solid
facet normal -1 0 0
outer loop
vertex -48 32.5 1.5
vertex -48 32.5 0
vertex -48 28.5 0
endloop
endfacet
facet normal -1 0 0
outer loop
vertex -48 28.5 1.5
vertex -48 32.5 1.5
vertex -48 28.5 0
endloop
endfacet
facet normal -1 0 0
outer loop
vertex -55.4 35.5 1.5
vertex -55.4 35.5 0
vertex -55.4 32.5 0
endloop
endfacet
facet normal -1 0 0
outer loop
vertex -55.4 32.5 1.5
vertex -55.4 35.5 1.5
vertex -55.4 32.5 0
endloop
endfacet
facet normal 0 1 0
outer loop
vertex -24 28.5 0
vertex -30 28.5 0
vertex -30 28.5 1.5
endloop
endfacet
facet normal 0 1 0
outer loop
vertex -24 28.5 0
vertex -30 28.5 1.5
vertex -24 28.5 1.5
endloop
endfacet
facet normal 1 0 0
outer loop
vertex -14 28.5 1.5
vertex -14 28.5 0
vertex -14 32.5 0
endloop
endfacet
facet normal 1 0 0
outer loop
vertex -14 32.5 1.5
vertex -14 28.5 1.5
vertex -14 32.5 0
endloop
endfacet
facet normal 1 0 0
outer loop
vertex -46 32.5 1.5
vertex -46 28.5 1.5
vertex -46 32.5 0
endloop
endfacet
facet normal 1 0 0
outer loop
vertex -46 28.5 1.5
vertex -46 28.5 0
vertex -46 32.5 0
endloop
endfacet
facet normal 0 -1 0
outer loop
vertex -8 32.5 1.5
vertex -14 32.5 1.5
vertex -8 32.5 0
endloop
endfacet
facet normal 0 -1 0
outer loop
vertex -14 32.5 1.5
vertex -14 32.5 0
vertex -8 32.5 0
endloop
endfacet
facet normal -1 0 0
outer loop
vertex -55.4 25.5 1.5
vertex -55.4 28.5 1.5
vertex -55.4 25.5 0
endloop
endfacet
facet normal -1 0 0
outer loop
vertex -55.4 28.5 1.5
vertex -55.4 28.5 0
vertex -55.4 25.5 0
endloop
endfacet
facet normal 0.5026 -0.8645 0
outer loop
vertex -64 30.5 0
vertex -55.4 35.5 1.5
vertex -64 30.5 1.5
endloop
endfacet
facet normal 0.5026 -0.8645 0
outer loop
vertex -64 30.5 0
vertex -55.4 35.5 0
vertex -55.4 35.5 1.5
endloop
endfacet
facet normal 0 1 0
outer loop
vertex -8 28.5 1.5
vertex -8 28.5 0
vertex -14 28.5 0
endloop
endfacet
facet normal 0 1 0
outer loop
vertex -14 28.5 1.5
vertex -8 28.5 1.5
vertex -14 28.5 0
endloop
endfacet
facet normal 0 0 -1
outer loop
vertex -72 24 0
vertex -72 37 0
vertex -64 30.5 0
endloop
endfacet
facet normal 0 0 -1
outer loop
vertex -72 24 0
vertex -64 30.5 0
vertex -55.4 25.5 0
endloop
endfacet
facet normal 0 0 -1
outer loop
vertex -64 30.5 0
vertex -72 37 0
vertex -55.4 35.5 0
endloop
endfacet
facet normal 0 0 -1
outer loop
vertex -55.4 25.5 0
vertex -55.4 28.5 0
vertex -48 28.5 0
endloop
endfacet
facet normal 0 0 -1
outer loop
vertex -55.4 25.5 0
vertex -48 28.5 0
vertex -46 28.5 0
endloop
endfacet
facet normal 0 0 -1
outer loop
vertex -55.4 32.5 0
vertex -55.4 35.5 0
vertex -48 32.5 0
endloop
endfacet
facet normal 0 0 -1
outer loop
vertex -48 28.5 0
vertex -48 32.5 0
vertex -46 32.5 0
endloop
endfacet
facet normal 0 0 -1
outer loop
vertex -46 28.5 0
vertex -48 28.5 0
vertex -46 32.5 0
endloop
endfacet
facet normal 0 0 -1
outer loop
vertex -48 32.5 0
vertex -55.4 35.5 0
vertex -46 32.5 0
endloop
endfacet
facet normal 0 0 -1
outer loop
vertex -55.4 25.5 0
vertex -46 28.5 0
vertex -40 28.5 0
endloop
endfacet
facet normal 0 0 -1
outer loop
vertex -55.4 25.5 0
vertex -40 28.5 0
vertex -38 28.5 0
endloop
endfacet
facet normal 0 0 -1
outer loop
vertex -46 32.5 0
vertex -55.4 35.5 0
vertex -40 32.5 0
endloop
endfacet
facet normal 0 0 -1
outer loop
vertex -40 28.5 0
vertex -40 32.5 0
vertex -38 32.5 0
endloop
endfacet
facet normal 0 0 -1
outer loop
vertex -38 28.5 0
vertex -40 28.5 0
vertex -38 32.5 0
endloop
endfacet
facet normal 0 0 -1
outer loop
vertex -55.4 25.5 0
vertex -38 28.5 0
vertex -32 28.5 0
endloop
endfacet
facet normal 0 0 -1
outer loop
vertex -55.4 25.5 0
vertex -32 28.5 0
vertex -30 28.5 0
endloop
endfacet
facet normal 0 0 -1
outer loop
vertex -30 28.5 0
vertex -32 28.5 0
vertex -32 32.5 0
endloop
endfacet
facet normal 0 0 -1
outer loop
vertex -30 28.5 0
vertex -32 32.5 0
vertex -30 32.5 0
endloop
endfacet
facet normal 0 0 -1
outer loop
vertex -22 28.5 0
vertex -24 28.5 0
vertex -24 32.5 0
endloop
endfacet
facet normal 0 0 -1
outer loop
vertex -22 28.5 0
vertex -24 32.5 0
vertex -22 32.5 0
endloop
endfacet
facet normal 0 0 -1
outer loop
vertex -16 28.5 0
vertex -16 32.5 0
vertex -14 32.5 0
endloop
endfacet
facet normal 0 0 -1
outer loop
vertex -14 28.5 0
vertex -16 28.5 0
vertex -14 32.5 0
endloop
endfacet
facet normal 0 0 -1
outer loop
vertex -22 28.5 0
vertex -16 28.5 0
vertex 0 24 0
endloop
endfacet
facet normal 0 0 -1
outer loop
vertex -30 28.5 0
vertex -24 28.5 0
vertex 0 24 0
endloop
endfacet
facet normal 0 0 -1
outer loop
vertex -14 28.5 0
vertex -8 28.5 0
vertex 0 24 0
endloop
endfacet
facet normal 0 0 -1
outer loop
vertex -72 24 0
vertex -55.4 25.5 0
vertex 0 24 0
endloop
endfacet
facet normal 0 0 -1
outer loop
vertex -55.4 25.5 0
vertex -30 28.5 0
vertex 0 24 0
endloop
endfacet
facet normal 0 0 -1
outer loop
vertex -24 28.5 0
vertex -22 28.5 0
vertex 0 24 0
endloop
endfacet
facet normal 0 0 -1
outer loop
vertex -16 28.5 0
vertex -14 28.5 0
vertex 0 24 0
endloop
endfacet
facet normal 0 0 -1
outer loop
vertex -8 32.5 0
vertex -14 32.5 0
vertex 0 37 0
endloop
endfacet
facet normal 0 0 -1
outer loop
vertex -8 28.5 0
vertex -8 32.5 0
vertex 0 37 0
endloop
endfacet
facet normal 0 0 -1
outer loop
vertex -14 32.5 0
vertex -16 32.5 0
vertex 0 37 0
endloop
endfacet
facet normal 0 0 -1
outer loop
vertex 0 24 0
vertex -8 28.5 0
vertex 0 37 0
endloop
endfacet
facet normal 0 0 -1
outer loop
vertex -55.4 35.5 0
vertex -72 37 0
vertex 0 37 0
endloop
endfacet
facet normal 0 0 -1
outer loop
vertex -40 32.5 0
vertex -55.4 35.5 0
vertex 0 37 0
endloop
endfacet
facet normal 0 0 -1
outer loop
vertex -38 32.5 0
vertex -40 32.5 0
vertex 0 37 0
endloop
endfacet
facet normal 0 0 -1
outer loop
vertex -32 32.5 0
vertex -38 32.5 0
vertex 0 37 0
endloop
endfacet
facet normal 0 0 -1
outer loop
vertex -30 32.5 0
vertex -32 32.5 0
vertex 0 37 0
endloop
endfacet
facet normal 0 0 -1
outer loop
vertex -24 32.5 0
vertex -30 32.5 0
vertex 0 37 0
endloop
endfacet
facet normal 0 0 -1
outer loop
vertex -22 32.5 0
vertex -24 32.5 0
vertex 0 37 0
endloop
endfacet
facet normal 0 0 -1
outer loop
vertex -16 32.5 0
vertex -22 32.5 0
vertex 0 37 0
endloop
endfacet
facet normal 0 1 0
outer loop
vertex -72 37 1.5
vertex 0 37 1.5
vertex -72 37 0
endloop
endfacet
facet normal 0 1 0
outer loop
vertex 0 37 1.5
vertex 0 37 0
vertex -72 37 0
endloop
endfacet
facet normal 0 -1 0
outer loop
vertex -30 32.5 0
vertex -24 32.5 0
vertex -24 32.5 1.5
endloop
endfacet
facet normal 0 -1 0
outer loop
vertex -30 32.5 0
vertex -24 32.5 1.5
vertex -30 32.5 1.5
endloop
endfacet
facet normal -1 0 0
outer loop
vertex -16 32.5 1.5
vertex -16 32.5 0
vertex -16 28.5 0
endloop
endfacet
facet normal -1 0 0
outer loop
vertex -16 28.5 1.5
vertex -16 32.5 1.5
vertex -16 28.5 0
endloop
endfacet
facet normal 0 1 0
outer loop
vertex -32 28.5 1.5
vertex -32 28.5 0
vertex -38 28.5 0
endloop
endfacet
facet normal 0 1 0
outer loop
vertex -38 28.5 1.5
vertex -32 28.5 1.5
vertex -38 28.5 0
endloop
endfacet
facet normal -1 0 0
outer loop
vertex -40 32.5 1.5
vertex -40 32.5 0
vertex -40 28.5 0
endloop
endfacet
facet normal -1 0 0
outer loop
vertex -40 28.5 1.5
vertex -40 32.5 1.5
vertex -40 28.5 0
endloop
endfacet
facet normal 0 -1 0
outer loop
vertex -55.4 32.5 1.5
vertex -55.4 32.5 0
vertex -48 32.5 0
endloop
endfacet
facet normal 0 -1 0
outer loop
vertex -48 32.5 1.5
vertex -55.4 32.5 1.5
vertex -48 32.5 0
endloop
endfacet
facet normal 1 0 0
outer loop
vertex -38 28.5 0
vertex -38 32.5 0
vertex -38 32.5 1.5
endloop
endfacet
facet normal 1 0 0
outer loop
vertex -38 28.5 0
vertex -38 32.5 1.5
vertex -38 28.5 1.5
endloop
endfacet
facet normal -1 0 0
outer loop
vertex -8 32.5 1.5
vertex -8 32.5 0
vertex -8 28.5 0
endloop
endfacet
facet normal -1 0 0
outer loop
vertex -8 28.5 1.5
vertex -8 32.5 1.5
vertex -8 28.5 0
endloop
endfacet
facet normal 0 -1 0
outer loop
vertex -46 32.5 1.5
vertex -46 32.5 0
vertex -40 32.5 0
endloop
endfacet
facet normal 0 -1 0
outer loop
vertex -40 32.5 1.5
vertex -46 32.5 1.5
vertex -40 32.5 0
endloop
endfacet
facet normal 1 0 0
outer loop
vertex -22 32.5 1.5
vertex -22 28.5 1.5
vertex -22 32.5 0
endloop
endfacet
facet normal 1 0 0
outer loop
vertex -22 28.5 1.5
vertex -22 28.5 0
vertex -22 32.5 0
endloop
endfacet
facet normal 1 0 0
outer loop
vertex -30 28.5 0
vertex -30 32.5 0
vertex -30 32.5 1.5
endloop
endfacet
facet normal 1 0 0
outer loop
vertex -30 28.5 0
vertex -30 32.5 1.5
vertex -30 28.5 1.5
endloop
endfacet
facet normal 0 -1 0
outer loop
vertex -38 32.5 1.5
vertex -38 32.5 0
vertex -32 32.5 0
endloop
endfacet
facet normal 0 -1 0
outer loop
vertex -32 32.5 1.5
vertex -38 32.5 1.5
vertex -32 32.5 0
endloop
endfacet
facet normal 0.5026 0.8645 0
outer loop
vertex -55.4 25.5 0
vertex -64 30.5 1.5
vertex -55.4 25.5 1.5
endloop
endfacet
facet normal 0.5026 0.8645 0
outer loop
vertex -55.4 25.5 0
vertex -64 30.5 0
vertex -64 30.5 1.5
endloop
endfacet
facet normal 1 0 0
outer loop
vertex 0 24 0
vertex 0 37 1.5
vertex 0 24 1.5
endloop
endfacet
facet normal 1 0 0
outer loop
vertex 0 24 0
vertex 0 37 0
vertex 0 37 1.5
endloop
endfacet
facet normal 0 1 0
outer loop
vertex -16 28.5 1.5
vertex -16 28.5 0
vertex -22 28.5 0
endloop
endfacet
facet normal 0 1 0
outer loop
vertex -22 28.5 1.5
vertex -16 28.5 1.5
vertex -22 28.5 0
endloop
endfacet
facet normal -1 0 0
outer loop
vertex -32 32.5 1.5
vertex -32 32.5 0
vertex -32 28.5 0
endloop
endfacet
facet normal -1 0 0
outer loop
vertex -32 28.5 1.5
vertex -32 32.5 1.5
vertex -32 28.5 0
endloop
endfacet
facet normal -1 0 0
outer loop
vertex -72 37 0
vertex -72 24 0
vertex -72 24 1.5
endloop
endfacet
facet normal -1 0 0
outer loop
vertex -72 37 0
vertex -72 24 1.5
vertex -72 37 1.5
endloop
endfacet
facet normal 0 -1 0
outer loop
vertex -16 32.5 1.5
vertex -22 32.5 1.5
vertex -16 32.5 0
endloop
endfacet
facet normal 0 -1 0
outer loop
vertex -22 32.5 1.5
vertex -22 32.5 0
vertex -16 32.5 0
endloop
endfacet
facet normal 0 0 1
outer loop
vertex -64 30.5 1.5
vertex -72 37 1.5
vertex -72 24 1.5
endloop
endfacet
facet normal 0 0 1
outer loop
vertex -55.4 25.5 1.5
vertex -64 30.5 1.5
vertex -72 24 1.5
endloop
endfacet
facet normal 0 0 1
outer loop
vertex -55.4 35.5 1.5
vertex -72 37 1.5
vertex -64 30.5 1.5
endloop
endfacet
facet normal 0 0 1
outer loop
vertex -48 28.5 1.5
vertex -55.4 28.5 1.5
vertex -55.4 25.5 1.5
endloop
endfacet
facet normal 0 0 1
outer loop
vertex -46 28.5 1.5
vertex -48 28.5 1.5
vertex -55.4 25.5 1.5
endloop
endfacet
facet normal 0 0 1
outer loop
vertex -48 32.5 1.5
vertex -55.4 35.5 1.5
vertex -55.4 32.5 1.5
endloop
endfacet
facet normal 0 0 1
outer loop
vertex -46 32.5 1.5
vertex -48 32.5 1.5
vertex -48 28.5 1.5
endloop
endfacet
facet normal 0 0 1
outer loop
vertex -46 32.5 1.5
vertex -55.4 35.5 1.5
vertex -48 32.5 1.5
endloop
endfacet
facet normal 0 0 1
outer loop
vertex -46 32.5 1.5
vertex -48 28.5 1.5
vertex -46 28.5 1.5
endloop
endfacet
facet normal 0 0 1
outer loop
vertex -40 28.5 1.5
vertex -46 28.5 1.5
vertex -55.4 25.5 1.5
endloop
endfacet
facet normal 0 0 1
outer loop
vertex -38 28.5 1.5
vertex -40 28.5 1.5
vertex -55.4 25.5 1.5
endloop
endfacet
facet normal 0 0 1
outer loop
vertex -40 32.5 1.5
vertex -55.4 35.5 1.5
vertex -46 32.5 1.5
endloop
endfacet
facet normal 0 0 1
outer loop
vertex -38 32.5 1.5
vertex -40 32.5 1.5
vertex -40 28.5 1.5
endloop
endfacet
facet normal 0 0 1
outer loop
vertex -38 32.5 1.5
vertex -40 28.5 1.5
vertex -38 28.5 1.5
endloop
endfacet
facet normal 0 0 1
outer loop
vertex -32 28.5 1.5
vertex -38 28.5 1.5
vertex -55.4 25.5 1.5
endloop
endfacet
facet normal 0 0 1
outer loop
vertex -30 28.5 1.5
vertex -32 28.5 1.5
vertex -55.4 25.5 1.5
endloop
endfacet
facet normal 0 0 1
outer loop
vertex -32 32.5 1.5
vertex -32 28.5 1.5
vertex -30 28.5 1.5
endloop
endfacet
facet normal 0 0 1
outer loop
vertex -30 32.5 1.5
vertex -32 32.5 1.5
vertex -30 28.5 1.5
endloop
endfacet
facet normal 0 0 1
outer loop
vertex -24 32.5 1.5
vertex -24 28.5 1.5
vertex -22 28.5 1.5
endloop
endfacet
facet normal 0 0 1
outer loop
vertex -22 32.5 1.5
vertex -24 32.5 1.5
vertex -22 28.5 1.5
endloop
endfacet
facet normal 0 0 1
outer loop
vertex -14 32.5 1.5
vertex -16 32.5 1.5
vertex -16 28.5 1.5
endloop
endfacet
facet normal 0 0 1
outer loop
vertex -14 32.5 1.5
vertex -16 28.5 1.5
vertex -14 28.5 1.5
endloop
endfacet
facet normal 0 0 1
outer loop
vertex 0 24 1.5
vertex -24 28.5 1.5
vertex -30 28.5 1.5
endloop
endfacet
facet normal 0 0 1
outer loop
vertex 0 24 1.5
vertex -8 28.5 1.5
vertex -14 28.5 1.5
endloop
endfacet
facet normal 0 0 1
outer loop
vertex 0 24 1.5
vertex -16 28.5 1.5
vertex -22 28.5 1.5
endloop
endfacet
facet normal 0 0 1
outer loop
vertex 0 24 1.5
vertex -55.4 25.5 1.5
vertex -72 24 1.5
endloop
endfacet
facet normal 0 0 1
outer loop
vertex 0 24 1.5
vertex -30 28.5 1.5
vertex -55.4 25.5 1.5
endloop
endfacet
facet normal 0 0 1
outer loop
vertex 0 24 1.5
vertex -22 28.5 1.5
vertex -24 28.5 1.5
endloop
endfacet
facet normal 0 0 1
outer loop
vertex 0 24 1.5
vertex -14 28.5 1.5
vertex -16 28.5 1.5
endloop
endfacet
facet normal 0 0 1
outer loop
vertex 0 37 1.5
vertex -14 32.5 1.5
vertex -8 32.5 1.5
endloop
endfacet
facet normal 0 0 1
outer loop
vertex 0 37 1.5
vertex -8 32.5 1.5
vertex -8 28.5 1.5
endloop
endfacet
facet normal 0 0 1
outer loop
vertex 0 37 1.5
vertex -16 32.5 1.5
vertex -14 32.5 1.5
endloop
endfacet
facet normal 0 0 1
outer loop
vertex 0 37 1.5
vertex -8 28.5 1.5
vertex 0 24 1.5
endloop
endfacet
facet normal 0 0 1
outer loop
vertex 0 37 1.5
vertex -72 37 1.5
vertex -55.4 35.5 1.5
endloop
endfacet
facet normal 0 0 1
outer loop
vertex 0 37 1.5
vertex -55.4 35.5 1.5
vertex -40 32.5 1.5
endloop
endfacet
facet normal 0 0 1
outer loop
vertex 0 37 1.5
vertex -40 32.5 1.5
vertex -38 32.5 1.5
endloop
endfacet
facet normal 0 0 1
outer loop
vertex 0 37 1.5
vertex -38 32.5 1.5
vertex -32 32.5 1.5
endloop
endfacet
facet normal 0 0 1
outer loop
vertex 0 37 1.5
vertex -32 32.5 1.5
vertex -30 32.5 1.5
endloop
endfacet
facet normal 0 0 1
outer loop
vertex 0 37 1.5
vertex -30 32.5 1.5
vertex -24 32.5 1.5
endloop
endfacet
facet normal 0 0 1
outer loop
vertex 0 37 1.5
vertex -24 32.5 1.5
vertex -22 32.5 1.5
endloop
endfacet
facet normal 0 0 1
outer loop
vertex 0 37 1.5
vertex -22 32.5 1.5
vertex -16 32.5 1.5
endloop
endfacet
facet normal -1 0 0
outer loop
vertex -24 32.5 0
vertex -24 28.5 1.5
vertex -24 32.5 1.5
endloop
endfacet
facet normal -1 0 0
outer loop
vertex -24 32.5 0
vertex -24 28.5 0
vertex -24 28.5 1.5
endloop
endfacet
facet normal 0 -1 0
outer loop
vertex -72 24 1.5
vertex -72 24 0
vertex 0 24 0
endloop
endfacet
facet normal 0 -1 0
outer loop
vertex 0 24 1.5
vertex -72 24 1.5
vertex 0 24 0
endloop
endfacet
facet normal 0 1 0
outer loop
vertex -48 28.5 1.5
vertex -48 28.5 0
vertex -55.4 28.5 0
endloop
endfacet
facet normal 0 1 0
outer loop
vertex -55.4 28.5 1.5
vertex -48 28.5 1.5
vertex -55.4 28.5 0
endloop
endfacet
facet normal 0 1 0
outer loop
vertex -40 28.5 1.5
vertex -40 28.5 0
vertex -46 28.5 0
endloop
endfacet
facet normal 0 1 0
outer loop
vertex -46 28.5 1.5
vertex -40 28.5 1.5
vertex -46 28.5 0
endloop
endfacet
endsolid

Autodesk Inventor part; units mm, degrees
ref_plane "YZ Plane" through (0, 0, 0) normal (1, 0, 0) x (0, 1, 0)
ref_plane "XZ Plane" through (0, 0, 0) normal (0, 1, 0) x (-1, 0, 0)
ref_plane "XY Plane" through (0, 0, 0) normal (0, 0, 1) x (1, 0, 0)
sketch "Sketch1" plane through (0, 0, 0) normal (0, 0, 1) x (1, 0, 0)
  line L0 (-64, 0) -> (-72, 0)
  line L1 (0, 37) -> (0, 24)
  line L2 (-72, 24) -> (-72, 37)
  line L3 (0, 0) -> (0, 24) construction
  line L4 (-72, 24) -> (0, 24)
  line L5 (-24, 22.0212) -> (-24, 32.5) construction
  line L6 (-24, 32.5) -> (-30, 32.5)
  line L7 (-30, 32.5) -> (-30, 28.5)
  line L8 (-30, 28.5) -> (-24, 28.5)
  line L9 (-24, 28.5) -> (-24, 32.5)
  line L10 (-30, 32.5) -> (-35, 32.5) construction
  line L11 (-22, 32.5) -> (-16, 32.5)
  line L12 (-16, 32.5) -> (-16, 28.5)
  line L13 (-16, 28.5) -> (-22, 28.5)
  line L14 (-22, 28.5) -> (-22, 32.5)
  line L15 (-14, 32.5) -> (-8, 32.5)
  line L16 (-8, 32.5) -> (-8, 28.5)
  line L17 (-8, 28.5) -> (-14, 28.5)
  line L18 (-14, 28.5) -> (-14, 32.5)
  line L19 (0, 24) -> (0, 37) construction
  line L20 (0, 37) -> (-91.064, 37) construction
  line L21 (0, 37) -> (-72, 37)
  line L22 (-72, 24) -> (-72, 37)
  line L23 (0, 24) -> (0, 37)
  line L24 (-72, 24) -> (-72, 30.5) construction
  line L25 (-72, 30.5) -> (-41.865, 30.5) construction
  line L26 (-64, 30.5) -> (-55.4, 30.5) construction
  line L27 (-55.4, 30.5) -> (-55.4, 35.5) construction
  line L28 (-55.4, 35.5) -> (-64, 30.5)
  line L29 (-55.4, 30.5) -> (-55.4, 25.5) construction
  line L30 (-64, 30.5) -> (-55.4, 25.5)
  line L31 (-32, 28.5) -> (-38, 28.5)
  line L32 (-38, 28.5) -> (-38, 32.5) construction
  line L33 (-38, 32.5) -> (-32, 32.5)
  line L34 (-32, 32.5) -> (-32, 28.5) construction
  line L35 (-38, 32.5) -> (-38, 28.5)
  line L36 (-32, 32.5) -> (-32, 28.5)
  line L37 (-40, 28.5) -> (-46, 28.5)
  line L38 (-46, 28.5) -> (-46, 32.5)
  line L39 (-46, 32.5) -> (-40, 32.5)
  line L40 (-40, 32.5) -> (-40, 28.5)
  line L41 (-55.4, 35.5) -> (-55.4, 32.5)
  line L42 (-55.4, 32.5) -> (-48, 32.5)
  line L43 (-48, 32.5) -> (-48, 28.5)
  line L44 (-48, 28.5) -> (-55.4, 28.5)
  line L45 (-55.4, 28.5) -> (-55.4, 25.5)
  point P0 (0, 0)
  point P1 (-137.4598, 47.0487)
  point P2 (-11, 28.5)
  point P3 (-11, 32.5)
  point P4 (-30, 30.5)
  point P5 (-32, 30.5)
  point P6 (-38, 30.5)
  point P7 (-40, 30.5)
  point P8 (-46, 30.5)
  point P9 (-48, 30.5)
  dimension "d3" = 0
  dimension "d4" = 0
  dimension "d8" = 24
  dimension "d14" = 6
  dimension "d19" = 6
  dimension "d20" = 4
  dimension "d21" = 6
  dimension "d22" = 2
  dimension "d23" = 2
  dimension "d33" = 8
  dimension "d36" = 28.5
  dimension "d37" = 13
  dimension "d38" = 4
  dimension "d39" = 8.6
  dimension "d40" = 5
  dimension "d41" = 5
  dimension "d42" = 6
  dimension "d43" = 4
  dimension "d44" = 2
  dimension "d45" = 6
  dimension "d46" = 2
  dimension "d47" = 3
  dimension "d48" = 7.4
extrude "Extrusion2" add sketch "Sketch1" along normal blind 1.5
properties part number "MS_R_Front_Green_v3"
